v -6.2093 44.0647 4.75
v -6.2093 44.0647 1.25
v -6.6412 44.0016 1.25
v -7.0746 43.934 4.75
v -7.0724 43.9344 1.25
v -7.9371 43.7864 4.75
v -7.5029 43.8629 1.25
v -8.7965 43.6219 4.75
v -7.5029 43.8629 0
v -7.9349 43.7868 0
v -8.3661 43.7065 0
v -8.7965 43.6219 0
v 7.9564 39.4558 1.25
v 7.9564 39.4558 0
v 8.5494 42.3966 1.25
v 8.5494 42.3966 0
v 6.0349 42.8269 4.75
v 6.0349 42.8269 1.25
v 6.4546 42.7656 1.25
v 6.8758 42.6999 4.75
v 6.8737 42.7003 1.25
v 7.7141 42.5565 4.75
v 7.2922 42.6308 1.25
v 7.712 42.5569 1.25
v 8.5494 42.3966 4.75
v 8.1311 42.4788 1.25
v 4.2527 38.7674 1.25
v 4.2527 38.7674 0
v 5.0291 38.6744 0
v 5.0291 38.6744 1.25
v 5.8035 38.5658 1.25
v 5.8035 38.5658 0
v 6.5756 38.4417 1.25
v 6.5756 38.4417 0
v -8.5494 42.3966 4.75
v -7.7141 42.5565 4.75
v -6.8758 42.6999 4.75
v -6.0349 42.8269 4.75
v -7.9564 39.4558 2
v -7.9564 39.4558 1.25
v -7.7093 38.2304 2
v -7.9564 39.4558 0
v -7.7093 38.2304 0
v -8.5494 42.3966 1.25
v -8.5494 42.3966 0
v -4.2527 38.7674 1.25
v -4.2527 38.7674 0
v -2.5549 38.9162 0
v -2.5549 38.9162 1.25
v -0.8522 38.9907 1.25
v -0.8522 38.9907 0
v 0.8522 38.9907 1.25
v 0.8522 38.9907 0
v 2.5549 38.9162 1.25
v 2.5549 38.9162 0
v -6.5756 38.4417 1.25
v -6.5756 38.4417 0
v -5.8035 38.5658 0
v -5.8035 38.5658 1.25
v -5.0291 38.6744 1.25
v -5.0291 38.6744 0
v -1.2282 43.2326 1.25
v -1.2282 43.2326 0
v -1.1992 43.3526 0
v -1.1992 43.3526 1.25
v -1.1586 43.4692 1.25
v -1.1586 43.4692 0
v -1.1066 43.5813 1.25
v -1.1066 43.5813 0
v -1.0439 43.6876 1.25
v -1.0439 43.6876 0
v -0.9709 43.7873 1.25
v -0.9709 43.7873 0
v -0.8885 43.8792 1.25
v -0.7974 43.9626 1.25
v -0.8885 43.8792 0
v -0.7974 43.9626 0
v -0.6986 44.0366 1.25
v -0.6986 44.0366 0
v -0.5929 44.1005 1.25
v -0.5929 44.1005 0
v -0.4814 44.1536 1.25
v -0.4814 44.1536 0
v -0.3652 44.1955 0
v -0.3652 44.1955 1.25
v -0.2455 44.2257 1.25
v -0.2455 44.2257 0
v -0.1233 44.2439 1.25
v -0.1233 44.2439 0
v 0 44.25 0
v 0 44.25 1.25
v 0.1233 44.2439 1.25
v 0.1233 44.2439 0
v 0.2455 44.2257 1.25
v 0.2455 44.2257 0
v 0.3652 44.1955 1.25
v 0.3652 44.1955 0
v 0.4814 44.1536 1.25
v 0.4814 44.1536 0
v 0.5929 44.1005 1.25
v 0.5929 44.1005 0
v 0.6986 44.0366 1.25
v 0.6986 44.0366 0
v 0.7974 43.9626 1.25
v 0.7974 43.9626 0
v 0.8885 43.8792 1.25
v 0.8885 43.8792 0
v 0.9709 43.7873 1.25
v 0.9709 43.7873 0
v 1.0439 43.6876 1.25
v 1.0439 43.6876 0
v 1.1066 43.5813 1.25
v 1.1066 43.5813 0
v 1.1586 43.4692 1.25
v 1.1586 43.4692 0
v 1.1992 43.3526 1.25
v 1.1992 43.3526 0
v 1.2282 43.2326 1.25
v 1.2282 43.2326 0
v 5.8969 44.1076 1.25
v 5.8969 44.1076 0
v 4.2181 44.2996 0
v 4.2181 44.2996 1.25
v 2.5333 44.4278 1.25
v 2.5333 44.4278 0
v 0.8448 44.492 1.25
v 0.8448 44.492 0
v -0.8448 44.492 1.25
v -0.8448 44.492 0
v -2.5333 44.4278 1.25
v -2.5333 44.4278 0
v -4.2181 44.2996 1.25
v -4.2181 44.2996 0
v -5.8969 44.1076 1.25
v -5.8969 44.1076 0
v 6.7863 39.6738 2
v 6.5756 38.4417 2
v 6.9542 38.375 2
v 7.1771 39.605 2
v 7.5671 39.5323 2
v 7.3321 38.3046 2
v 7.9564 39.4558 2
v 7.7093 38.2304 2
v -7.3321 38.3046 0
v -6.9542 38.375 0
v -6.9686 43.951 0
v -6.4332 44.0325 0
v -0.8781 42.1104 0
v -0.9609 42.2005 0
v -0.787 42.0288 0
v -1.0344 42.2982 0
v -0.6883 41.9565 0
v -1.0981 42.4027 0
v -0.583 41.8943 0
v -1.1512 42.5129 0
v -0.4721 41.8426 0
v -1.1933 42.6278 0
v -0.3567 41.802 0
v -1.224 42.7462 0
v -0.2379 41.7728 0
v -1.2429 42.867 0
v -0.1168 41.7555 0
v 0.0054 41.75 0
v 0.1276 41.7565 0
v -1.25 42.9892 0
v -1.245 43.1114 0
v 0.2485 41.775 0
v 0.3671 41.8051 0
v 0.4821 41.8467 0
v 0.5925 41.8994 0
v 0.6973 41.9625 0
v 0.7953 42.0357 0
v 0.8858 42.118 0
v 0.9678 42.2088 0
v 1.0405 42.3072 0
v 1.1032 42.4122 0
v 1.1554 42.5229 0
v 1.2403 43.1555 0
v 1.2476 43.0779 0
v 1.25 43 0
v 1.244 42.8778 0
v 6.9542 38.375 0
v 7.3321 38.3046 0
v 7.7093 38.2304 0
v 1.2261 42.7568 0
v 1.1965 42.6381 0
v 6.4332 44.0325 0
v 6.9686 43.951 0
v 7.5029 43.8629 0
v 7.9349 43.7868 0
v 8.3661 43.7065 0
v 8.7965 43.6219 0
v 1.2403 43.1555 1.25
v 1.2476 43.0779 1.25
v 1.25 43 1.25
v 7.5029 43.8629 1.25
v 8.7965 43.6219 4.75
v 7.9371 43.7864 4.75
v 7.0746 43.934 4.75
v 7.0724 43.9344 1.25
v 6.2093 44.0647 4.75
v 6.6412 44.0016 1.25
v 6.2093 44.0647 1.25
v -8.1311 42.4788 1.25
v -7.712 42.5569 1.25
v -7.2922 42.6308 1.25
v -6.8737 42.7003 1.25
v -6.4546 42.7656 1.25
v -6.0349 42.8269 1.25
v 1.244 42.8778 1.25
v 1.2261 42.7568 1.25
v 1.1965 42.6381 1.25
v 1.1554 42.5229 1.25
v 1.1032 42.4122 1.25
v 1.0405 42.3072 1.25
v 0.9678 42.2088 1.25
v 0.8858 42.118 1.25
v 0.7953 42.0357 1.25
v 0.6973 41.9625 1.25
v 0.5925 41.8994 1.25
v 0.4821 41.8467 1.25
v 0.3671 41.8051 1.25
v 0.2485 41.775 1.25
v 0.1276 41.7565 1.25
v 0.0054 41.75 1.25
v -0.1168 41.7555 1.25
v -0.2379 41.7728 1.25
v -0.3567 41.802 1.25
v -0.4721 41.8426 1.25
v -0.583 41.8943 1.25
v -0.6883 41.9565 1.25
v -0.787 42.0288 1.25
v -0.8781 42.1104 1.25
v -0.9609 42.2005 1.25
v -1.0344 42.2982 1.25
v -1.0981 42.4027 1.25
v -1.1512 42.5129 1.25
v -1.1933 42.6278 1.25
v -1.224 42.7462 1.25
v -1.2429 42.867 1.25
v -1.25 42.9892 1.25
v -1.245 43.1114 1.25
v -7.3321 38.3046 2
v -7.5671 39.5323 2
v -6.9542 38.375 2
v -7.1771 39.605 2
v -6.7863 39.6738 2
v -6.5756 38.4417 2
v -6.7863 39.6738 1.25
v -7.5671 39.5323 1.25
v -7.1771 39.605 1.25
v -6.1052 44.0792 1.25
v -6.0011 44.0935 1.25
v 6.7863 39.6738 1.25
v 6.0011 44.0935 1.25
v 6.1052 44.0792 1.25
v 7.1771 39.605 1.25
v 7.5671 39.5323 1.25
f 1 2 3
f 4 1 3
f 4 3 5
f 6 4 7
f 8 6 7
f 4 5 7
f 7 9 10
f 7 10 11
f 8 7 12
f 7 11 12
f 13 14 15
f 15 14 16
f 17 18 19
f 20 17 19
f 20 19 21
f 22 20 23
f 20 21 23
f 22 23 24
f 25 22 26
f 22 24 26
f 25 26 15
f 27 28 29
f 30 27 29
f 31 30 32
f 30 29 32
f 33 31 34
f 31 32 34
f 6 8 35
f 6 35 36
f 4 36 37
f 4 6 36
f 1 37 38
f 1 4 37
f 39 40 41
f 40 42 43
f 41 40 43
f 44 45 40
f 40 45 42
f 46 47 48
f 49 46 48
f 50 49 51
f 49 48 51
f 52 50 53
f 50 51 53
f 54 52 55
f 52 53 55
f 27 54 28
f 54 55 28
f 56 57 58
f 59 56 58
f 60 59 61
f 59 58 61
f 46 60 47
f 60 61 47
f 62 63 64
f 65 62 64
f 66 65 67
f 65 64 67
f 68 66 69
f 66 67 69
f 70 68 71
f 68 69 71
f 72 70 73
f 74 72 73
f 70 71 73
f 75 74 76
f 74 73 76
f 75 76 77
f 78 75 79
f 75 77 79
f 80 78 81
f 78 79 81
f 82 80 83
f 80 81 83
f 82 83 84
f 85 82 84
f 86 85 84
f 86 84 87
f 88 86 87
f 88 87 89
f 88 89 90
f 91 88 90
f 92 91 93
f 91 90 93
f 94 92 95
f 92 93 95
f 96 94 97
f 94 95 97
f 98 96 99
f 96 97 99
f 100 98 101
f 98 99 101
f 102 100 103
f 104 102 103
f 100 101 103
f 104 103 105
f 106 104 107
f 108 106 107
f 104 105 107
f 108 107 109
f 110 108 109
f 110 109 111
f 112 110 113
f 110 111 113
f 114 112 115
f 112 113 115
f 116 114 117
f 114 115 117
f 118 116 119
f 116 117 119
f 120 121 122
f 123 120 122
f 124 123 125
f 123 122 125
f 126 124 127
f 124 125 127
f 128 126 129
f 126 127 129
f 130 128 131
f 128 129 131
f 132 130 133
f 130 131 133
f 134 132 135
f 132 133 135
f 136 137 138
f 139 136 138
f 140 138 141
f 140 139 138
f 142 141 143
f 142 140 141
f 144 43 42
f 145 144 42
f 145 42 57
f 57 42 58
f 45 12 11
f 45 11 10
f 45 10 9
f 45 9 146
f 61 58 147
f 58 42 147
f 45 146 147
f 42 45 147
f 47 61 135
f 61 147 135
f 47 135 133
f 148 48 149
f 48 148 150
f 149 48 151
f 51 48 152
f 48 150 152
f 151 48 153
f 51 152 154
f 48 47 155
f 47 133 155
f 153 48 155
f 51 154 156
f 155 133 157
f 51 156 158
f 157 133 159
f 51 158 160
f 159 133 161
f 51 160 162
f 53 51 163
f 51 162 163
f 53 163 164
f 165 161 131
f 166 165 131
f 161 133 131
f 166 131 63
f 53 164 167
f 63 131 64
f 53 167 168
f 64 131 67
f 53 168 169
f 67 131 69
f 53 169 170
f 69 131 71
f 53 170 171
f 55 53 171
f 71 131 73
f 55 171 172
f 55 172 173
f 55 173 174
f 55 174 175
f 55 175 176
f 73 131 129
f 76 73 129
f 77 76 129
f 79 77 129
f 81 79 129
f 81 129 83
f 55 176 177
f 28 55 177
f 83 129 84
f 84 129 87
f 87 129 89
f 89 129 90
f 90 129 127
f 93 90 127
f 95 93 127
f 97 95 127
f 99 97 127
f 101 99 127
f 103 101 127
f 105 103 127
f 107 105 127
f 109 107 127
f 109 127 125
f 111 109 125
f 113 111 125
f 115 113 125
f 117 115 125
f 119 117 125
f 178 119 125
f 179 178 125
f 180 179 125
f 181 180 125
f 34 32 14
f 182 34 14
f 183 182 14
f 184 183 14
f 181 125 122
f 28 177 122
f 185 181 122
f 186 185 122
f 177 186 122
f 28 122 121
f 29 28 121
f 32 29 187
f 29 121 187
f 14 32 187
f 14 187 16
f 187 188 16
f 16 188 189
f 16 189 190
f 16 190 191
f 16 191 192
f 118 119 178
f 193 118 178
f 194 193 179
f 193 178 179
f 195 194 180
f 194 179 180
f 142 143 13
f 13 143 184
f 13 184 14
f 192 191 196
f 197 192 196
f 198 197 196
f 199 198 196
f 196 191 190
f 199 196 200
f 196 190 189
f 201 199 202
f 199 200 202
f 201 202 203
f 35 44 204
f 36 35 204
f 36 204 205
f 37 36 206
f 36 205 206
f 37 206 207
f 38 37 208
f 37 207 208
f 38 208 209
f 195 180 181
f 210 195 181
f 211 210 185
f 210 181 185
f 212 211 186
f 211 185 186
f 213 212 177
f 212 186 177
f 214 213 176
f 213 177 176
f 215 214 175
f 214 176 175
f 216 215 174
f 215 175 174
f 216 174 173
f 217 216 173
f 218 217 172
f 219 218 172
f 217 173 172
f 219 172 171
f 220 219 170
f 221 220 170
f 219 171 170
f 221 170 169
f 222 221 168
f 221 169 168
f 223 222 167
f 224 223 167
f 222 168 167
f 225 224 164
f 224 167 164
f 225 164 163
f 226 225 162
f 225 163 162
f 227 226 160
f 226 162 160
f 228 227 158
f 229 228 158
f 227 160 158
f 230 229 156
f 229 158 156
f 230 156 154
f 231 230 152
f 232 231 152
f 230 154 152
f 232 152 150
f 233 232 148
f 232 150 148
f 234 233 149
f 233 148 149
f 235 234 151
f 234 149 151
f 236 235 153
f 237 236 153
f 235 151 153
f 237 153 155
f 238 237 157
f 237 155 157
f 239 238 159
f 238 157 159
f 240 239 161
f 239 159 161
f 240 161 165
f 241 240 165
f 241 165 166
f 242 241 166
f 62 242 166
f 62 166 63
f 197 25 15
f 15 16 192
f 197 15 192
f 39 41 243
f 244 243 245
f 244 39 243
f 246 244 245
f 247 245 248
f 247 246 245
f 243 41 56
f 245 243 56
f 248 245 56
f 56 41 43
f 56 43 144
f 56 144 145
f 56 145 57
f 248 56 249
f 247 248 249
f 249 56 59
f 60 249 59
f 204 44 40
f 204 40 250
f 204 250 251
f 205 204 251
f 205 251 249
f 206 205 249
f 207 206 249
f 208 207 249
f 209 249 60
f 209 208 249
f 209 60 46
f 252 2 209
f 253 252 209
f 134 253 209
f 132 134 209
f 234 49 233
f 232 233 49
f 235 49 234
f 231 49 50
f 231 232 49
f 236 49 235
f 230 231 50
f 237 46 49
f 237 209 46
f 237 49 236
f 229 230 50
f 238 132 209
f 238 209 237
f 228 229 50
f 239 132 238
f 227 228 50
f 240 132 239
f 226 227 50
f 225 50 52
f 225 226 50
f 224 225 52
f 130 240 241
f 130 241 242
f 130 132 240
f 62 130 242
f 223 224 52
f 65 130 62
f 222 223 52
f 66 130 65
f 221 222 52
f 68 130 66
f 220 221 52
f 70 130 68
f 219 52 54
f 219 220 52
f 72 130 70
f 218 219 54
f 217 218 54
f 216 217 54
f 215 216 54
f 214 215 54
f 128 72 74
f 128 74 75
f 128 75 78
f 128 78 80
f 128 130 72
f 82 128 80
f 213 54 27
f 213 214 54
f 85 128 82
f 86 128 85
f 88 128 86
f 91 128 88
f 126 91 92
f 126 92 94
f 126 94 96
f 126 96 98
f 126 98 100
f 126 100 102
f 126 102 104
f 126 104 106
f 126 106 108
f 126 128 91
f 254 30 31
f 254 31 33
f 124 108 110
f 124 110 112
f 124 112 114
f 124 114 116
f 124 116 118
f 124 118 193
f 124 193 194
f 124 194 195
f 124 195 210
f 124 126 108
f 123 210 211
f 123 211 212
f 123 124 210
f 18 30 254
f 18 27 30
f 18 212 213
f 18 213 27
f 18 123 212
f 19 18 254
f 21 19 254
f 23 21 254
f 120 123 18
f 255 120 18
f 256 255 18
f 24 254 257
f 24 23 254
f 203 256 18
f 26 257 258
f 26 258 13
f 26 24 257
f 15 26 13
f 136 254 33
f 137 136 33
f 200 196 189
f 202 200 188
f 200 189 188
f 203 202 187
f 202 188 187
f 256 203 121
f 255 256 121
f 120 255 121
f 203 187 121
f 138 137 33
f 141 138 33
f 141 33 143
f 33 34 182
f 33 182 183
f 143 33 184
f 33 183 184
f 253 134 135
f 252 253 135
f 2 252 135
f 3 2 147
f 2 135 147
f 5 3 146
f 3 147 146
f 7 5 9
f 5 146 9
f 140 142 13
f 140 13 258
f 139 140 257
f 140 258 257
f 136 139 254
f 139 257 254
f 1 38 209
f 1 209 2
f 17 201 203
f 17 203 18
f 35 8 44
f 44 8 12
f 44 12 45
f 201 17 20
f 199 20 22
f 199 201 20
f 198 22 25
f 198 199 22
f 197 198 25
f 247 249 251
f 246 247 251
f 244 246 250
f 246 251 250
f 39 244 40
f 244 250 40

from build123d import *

# Parameters (mm, degrees)
F1_DEPTH = 1.25
F3_DEPTH = 4.75
F5_DEPTH = 2


with BuildPart() as f1:
    # F0 (on Top) → F1 (new body)
    with BuildSketch(Plane.XY):
        with BuildLine():
            ThreePointArc((5.9976509575, 42.832122093), (6.6456632834, 42.7363739632), (7.2921511628, 42.6308225515))
            Line((7.2921511628, 42.6308225515), (7.5029069767, 43.8629272495))
            ThreePointArc((7.5029069767, 43.8629272495), (6.7010150496, 43.9925720697), (5.8968902794, 44.1075581395))
            ThreePointArc((5.8968902794, 44.1075581395), (5.9741669577, 43.5561736795), (6, 43))
            ThreePointArc((6, 43), (5.9994127106, 42.9160528296), (5.9976509575, 42.832122093))
        make_face()
        with BuildLine():
            Line((-7.5029069767, 43.8629272495), (-7.2921511628, 42.6308225515))
            ThreePointArc((-7.2921511628, 42.6308225515), (-6.6456632834, 42.7363739632), (-5.9976509575, 42.832122093))
            ThreePointArc((-5.9976509575, 42.832122093), (-5.9813637313, 43.4725335051), (-5.8968902794, 44.1075581395))
            ThreePointArc((-5.8968902794, 44.1075581395), (-6.7010150496, 43.9925720697), (-7.5029069767, 43.8629272495))
        make_face()
        with BuildLine():
            ThreePointArc((1.2281761729, 43.2325581395), (3.6184570865, 43.0983673509), (5.9976509575, 42.832122093))
            ThreePointArc((5.9976509575, 42.832122093), (5.9994127106, 42.9160528296), (6, 43))
            ThreePointArc((6, 43), (5.9741669577, 43.5561736795), (5.8968902794, 44.1075581395))
            ThreePointArc((5.8968902794, 44.1075581395), (0, 44.5), (-5.8968902794, 44.1075581395))
            ThreePointArc((-5.8968902794, 44.1075581395), (-5.9813637313, 43.4725335051), (-5.9976509575, 42.832122093))
            ThreePointArc((-5.9976509575, 42.832122093), (-3.6184570865, 43.0983673509), (-1.2281761729, 43.2325581395))
            ThreePointArc((-1.2281761729, 43.2325581395), (0, 44.25), (1.2281761729, 43.2325581395))
        make_face()
        with BuildLine():
            ThreePointArc((5.1487358592, 39.9193313953), (5.9687994799, 39.804973719), (6.7863372093, 39.6737712763))
            Line((6.7863372093, 39.6737712763), (7.2921511628, 42.6308225515))
            ThreePointArc((7.2921511628, 42.6308225515), (6.6456632834, 42.7363739632), (5.9976509575, 42.832122093))
            ThreePointArc((5.9976509575, 42.832122093), (5.7603447969, 41.3211826125), (5.1487358592, 39.9193313953))
        make_face()
        with BuildLine():
            ThreePointArc((-5.1487358592, 39.9193313953), (0, 40.25), (5.1487358592, 39.9193313953))
            ThreePointArc((5.1487358592, 39.9193313953), (5.7603447969, 41.3211826125), (5.9976509575, 42.832122093))
            ThreePointArc((5.9976509575, 42.832122093), (3.6184570865, 43.0983673509), (1.2281761729, 43.2325581395))
            ThreePointArc((1.2281761729, 43.2325581395), (1.244532084, 43.1167899479), (1.25, 43))
            ThreePointArc((1.25, 43), (-0.1167899479, 41.755467916), (-1.2281761729, 43.2325581395))
            ThreePointArc((-1.2281761729, 43.2325581395), (-3.6184570865, 43.0983673509), (-5.9976509575, 42.832122093))
            ThreePointArc((-5.9976509575, 42.832122093), (-5.7603447969, 41.3211826125), (-5.1487358592, 39.9193313953))
        make_face()
        with BuildLine():
            Line((-7.2921511628, 42.6308225515), (-6.7863372093, 39.6737712763))
            ThreePointArc((-6.7863372093, 39.6737712763), (-5.9687994799, 39.804973719), (-5.1487358592, 39.9193313953))
            ThreePointArc((-5.1487358592, 39.9193313953), (-5.7603447969, 41.3211826125), (-5.9976509575, 42.832122093))
            ThreePointArc((-5.9976509575, 42.832122093), (-6.6456632834, 42.7363739632), (-7.2921511628, 42.6308225515))
        make_face()
        with BuildLine():
            Line((-6.7863372093, 39.6737712763), (-6.5755813953, 38.4416665782))
            ThreePointArc((-6.5755813953, 38.4416665782), (-5.4165900946, 38.6220215906), (-4.2526993305, 38.7674418605))
            ThreePointArc((-4.2526993305, 38.7674418605), (-4.7358693269, 39.3160426552), (-5.1487358592, 39.9193313953))
            ThreePointArc((-5.1487358592, 39.9193313953), (-5.9687994799, 39.804973719), (-6.7863372093, 39.6737712763))
        make_face()
        with BuildLine():
            ThreePointArc((-4.2526993305, 38.7674418605), (0, 39), (4.2526993305, 38.7674418605))
            ThreePointArc((4.2526993305, 38.7674418605), (4.7358693269, 39.3160426552), (5.1487358592, 39.9193313953))
            ThreePointArc((5.1487358592, 39.9193313953), (0, 40.25), (-5.1487358592, 39.9193313953))
            ThreePointArc((-5.1487358592, 39.9193313953), (-4.7358693269, 39.3160426552), (-4.2526993305, 38.7674418605))
        make_face()
        with BuildLine():
            ThreePointArc((4.2526993305, 38.7674418605), (5.4165900946, 38.6220215906), (6.5755813953, 38.4416665782))
            Line((6.5755813953, 38.4416665782), (6.7863372093, 39.6737712763))
            ThreePointArc((6.7863372093, 39.6737712763), (5.9687994799, 39.804973719), (5.1487358592, 39.9193313953))
            ThreePointArc((5.1487358592, 39.9193313953), (4.7358693269, 39.3160426552), (4.2526993305, 38.7674418605))
        make_face()
        with BuildLine():
            ThreePointArc((6.7863372093, 39.6737712763), (7.3721720875, 39.5690987857), (7.9563953488, 39.4557761684))
            Line((7.9563953488, 39.4557761684), (8.5494186047, 42.3965793611))
            ThreePointArc((8.5494186046, 42.3965793611), (7.9216507524, 42.5183483846), (7.2921511628, 42.6308225515))
            Line((7.2921511628, 42.6308225515), (6.7863372093, 39.6737712763))
        make_face()
        with BuildLine():
            Line((-8.5494186047, 42.3965793611), (-7.9563953488, 39.4557761684))
            ThreePointArc((-7.9563953488, 39.4557761684), (-7.3721720874, 39.5690987857), (-6.7863372093, 39.6737712763))
            Line((-6.7863372093, 39.6737712763), (-7.2921511628, 42.6308225515))
            ThreePointArc((-7.2921511628, 42.6308225515), (-7.9216507524, 42.5183483846), (-8.5494186046, 42.3965793611))
        make_face()
    extrude(amount=F1_DEPTH)

    # F2 (on Top) → F3 (join)
    with BuildSketch(Plane.XY):
        with BuildLine():
            ThreePointArc((6.0348837209, 42.8268920011), (7.2953245865, 42.6302796047), (8.5494186046, 42.3965793611))
            Line((8.5494186047, 42.3965793611), (8.7965116279, 43.6219140247))
            ThreePointArc((8.7965116279, 43.6219140247), (7.5061721179, 43.8623686106), (6.2093023256, 44.0646634462))
            Line((6.2093023256, 44.0646634462), (6.0348837209, 42.8268920011))
        make_face()
        with BuildLine():
            Line((-8.7965116279, 43.6219140247), (-8.5494186047, 42.3965793611))
            ThreePointArc((-8.5494186046, 42.3965793611), (-7.2953245865, 42.6302796047), (-6.0348837209, 42.8268920011))
            Line((-6.0348837209, 42.8268920011), (-6.2093023256, 44.0646634462))
            ThreePointArc((-6.2093023256, 44.0646634462), (-7.5061721179, 43.8623686106), (-8.7965116279, 43.6219140247))
        make_face()
    extrude(amount=F3_DEPTH)

    # F4 (on Top) → F5 (join)
    with BuildSketch(Plane.XY):
        with BuildLine():
            Line((-7.9563953488, 39.4557761684), (-7.7093023256, 38.2304415048))
            ThreePointArc((-7.7093023256, 38.2304415048), (-7.1432226437, 38.3402447862), (-6.5755813953, 38.4416665782))
            Line((-6.5755813953, 38.4416665782), (-6.7863372093, 39.6737712763))
            ThreePointArc((-6.7863372093, 39.6737712763), (-7.3721720874, 39.5690987857), (-7.9563953488, 39.4557761684))
        make_face()
        with BuildLine():
            ThreePointArc((6.5755813953, 38.4416665782), (7.1432226437, 38.3402447862), (7.7093023256, 38.2304415048))
            Line((7.7093023256, 38.2304415048), (7.9563953488, 39.4557761684))
            ThreePointArc((7.9563953488, 39.4557761684), (7.3721720875, 39.5690987857), (6.7863372093, 39.6737712763))
            Line((6.7863372093, 39.6737712763), (6.5755813953, 38.4416665782))
        make_face()
    extrude(amount=F5_DEPTH)


solid = f1.part
